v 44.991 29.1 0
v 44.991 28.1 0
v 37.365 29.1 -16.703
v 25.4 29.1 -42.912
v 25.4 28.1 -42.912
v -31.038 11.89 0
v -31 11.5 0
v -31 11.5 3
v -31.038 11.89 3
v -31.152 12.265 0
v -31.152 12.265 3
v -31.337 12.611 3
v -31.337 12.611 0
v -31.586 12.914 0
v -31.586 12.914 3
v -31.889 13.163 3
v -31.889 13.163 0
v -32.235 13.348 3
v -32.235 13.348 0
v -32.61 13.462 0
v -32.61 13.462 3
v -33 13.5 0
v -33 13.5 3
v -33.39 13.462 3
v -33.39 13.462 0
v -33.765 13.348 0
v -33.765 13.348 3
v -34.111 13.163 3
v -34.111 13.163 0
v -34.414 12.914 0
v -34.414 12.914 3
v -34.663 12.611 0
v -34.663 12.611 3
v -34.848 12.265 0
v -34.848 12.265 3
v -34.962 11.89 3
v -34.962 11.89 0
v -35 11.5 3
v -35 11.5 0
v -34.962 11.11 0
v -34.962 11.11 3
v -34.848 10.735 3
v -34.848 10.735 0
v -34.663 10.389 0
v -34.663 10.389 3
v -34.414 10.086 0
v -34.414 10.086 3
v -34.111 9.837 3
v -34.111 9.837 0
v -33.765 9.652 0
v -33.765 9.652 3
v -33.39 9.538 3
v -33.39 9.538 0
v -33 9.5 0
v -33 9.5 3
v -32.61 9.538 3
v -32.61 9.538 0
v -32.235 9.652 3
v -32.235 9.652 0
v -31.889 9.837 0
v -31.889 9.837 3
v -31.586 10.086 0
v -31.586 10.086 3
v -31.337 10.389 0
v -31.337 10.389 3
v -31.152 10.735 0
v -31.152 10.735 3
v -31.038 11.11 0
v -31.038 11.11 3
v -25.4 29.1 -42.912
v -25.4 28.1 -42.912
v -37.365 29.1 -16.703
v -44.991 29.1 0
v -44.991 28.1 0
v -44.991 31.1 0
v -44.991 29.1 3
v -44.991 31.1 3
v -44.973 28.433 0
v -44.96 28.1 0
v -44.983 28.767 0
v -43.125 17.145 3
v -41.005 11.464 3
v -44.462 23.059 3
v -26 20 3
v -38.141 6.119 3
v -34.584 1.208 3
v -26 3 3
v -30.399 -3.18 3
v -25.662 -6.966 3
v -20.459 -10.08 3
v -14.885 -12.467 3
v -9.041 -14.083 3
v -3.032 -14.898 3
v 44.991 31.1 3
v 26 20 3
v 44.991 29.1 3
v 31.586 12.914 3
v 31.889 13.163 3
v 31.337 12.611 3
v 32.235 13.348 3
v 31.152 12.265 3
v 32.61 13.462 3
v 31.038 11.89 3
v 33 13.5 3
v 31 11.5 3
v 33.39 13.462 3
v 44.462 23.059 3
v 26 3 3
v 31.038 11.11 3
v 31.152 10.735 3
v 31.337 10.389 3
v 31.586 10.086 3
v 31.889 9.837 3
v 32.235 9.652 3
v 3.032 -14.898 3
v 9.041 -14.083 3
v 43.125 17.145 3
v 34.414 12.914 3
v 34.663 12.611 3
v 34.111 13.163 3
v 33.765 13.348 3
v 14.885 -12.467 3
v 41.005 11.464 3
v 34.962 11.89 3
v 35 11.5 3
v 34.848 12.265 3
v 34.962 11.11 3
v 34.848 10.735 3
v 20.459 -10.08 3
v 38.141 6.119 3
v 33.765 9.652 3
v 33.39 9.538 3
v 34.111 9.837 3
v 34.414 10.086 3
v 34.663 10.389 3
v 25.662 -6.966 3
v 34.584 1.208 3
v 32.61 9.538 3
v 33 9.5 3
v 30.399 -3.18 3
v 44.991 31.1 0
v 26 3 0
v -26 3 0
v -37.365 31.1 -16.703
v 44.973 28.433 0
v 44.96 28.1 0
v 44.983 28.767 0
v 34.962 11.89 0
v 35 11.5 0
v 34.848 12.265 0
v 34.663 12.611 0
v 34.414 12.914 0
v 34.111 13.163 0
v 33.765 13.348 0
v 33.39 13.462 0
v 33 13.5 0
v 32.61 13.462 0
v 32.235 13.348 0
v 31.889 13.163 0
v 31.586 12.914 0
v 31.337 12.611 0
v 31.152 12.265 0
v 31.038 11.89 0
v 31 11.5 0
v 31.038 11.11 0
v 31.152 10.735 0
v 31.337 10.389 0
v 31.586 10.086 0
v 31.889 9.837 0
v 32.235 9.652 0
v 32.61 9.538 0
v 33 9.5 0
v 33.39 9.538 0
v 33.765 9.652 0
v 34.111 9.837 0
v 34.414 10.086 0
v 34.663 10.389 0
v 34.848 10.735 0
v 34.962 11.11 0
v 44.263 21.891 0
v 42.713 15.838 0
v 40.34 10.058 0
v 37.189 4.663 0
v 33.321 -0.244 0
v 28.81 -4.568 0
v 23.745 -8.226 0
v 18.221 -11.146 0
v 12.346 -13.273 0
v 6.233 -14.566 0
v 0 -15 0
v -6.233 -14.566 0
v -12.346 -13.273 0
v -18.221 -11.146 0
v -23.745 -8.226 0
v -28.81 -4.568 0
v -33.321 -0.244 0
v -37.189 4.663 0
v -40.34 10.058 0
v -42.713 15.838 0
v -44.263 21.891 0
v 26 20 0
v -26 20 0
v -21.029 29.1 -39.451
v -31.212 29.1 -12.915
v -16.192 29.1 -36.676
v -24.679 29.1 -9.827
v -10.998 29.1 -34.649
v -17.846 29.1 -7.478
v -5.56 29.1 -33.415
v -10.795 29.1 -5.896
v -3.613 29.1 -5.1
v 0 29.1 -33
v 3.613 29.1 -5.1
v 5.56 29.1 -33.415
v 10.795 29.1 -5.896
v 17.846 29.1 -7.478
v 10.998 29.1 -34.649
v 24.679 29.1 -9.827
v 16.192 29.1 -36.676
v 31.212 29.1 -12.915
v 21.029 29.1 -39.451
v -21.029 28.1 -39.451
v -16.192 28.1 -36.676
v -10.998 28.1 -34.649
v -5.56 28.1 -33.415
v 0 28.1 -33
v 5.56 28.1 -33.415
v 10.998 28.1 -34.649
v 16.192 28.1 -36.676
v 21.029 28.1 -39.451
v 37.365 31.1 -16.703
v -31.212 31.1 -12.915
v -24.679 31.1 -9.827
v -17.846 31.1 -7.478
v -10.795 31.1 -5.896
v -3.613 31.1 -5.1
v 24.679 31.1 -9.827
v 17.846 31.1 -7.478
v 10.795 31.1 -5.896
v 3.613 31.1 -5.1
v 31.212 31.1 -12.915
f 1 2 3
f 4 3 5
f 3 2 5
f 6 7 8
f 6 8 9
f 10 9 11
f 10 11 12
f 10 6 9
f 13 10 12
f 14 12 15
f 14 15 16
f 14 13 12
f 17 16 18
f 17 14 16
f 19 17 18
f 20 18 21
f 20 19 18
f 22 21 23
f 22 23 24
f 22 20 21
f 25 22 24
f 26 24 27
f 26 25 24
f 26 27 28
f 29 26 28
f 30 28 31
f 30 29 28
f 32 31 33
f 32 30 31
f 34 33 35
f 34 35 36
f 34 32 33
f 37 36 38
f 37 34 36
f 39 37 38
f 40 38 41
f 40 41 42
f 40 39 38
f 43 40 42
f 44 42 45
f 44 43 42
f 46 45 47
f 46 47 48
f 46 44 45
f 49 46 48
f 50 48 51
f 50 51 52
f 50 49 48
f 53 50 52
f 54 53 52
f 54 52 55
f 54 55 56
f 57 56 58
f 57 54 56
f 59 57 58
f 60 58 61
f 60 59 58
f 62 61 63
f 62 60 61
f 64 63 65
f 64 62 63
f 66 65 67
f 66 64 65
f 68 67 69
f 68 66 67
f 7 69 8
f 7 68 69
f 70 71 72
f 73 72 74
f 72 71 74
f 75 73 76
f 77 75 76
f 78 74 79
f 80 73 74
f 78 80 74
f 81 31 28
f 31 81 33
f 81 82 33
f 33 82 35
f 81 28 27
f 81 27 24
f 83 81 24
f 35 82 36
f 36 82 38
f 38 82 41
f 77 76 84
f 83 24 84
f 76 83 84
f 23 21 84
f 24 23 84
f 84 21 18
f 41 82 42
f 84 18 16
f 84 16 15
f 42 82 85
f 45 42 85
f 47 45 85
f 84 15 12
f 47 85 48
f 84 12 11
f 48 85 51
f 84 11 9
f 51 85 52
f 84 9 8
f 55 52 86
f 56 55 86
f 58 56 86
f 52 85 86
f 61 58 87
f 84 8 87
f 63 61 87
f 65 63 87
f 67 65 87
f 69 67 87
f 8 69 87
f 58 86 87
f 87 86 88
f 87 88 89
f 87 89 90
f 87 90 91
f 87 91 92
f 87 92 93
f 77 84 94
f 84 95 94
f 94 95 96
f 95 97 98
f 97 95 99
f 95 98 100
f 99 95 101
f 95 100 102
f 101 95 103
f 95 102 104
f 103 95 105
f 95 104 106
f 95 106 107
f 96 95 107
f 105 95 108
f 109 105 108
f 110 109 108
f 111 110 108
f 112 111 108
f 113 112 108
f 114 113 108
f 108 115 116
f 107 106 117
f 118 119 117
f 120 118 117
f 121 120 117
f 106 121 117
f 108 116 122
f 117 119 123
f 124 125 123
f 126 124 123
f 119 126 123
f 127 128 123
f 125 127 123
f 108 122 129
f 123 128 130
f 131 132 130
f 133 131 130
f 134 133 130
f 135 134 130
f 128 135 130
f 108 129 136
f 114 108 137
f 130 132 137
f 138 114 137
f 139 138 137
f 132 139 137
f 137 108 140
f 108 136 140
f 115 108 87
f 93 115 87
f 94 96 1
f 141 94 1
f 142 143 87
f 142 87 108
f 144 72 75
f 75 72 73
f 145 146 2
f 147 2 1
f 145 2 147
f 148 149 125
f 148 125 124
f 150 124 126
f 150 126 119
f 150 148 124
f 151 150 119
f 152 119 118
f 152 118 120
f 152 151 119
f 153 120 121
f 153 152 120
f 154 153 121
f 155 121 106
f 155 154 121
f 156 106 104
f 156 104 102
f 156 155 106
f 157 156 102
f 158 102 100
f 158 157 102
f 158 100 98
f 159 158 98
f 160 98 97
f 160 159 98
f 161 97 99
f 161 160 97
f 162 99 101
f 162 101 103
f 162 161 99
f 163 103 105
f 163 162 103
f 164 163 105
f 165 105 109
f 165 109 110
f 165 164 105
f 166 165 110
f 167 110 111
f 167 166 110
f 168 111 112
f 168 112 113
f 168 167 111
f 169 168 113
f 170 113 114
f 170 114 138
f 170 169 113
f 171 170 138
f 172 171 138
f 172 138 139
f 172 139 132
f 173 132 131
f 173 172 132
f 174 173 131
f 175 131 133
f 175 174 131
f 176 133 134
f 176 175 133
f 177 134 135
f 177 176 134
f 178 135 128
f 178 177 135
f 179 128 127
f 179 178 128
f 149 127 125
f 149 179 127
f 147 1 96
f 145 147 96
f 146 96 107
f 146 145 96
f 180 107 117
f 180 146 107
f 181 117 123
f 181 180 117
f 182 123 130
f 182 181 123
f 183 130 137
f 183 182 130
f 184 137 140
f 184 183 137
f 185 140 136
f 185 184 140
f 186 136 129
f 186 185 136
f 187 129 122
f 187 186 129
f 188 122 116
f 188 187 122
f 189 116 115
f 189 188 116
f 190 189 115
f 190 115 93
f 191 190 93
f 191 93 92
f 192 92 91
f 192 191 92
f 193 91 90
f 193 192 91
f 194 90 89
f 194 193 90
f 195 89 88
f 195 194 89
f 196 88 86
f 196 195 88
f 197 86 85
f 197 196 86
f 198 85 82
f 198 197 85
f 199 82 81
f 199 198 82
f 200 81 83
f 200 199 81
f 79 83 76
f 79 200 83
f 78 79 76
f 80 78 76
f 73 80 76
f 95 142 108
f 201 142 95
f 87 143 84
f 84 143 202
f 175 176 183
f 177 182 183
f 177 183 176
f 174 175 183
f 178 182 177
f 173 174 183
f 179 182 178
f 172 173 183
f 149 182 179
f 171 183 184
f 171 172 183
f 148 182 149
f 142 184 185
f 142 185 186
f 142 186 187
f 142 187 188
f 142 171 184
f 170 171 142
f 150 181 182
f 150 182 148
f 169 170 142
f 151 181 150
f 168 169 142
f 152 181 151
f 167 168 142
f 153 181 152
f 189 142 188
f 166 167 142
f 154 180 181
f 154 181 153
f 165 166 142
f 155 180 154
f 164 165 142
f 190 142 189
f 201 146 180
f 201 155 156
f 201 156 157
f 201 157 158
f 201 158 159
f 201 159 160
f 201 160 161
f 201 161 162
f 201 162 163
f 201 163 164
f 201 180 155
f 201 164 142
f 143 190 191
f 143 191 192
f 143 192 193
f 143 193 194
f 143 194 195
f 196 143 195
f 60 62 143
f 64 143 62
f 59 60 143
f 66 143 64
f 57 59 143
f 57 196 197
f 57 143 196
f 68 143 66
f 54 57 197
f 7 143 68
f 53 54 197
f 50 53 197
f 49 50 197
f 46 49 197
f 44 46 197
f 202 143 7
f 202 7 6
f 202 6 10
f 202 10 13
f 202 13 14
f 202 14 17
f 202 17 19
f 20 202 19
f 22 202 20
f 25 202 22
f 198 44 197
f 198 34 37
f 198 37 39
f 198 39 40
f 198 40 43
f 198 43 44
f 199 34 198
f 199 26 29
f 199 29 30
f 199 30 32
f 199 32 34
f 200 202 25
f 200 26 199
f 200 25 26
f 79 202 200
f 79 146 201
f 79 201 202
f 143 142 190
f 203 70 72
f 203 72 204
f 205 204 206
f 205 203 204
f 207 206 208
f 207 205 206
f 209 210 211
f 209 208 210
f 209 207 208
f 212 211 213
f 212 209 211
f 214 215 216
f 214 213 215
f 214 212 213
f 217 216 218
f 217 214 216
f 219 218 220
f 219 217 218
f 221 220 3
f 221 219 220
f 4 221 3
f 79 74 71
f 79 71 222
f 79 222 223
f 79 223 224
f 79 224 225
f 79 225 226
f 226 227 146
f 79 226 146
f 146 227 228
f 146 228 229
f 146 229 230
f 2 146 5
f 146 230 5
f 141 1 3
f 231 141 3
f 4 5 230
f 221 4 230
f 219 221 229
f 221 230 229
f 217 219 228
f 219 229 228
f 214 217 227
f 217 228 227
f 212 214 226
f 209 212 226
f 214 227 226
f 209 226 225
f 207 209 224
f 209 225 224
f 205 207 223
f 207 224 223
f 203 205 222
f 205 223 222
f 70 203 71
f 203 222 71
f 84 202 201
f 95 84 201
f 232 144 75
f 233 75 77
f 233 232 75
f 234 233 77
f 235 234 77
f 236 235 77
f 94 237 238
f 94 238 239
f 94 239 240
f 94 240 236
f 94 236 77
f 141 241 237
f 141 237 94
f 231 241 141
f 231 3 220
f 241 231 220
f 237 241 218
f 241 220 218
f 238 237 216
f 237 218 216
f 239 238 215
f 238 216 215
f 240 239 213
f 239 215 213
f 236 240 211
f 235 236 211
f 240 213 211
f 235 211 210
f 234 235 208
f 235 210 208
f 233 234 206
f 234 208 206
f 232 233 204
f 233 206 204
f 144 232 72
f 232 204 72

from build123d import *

# Parameters (mm, degrees)
SKETCH1_R           = 2
SKETCH1_W           = 52
SKETCH1_H           = 17
BOSS_EXTRUDE1_DEPTH = 3
BOSS_EXTRUDE2_DEPTH = 1
BOSS_EXTRUDE3_DEPTH = 2


with BuildPart() as part:
    # Sketch1 → Boss-Extrude1 (new body)
    with BuildSketch(Plane.XY):
        with BuildLine():
            Line((-44.9909991, 29.1), (44.9909991, 29.1))
            ThreePointArc((44.9909991, 29.1), (0, -15), (-44.9909991, 29.1))
        make_face()
        with Locations((-33, 11.5)):
            Circle(SKETCH1_R, mode=Mode.SUBTRACT)
        with Locations((33, 11.5)):
            Circle(SKETCH1_R, mode=Mode.SUBTRACT)
        with Locations((0, 11.5)):
            Rectangle(SKETCH1_W, SKETCH1_H, mode=Mode.SUBTRACT)
    extrude(amount=BOSS_EXTRUDE1_DEPTH)

    # Sketch4 → Boss-Extrude2 (add)
    with BuildSketch(Plane(origin=(0, 28.1, 0), x_dir=(1, 0, 0), z_dir=(0, 1, 0))):
        with BuildLine():
            Line((-25.4, 42.912140351), (-44.9909991, 0))
            Line((-44.9909991, 0), (44.9909991, 0))
            Line((44.9909991, 0), (25.4, 42.912140351))
            ThreePointArc((25.4, 42.912140351), (0, 33), (-25.4, 42.912140351))
        make_face()
    extrude(amount=BOSS_EXTRUDE2_DEPTH)

    # Sketch5 → Boss-Extrude3 (add)
    with BuildSketch(Plane(origin=(0, 29.1, 0), x_dir=(1, 0, 0), z_dir=(0, 1, 0))):
        with BuildLine():
            Line((-37.365311148, 16.703313087), (-44.9909991, 0))
            Line((-44.9909991, 0), (-44.9909991, -3))
            Line((-44.9909991, -3), (44.9909991, -3))
            Line((44.9909991, -3), (44.9909991, 0))
            Line((44.9909991, 0), (37.365311148, 16.703313087))
            ThreePointArc((37.365311148, 16.703313087), (0, 5), (-37.365311148, 16.703313087))
        make_face()
    extrude(amount=BOSS_EXTRUDE3_DEPTH)


solid = part.part
